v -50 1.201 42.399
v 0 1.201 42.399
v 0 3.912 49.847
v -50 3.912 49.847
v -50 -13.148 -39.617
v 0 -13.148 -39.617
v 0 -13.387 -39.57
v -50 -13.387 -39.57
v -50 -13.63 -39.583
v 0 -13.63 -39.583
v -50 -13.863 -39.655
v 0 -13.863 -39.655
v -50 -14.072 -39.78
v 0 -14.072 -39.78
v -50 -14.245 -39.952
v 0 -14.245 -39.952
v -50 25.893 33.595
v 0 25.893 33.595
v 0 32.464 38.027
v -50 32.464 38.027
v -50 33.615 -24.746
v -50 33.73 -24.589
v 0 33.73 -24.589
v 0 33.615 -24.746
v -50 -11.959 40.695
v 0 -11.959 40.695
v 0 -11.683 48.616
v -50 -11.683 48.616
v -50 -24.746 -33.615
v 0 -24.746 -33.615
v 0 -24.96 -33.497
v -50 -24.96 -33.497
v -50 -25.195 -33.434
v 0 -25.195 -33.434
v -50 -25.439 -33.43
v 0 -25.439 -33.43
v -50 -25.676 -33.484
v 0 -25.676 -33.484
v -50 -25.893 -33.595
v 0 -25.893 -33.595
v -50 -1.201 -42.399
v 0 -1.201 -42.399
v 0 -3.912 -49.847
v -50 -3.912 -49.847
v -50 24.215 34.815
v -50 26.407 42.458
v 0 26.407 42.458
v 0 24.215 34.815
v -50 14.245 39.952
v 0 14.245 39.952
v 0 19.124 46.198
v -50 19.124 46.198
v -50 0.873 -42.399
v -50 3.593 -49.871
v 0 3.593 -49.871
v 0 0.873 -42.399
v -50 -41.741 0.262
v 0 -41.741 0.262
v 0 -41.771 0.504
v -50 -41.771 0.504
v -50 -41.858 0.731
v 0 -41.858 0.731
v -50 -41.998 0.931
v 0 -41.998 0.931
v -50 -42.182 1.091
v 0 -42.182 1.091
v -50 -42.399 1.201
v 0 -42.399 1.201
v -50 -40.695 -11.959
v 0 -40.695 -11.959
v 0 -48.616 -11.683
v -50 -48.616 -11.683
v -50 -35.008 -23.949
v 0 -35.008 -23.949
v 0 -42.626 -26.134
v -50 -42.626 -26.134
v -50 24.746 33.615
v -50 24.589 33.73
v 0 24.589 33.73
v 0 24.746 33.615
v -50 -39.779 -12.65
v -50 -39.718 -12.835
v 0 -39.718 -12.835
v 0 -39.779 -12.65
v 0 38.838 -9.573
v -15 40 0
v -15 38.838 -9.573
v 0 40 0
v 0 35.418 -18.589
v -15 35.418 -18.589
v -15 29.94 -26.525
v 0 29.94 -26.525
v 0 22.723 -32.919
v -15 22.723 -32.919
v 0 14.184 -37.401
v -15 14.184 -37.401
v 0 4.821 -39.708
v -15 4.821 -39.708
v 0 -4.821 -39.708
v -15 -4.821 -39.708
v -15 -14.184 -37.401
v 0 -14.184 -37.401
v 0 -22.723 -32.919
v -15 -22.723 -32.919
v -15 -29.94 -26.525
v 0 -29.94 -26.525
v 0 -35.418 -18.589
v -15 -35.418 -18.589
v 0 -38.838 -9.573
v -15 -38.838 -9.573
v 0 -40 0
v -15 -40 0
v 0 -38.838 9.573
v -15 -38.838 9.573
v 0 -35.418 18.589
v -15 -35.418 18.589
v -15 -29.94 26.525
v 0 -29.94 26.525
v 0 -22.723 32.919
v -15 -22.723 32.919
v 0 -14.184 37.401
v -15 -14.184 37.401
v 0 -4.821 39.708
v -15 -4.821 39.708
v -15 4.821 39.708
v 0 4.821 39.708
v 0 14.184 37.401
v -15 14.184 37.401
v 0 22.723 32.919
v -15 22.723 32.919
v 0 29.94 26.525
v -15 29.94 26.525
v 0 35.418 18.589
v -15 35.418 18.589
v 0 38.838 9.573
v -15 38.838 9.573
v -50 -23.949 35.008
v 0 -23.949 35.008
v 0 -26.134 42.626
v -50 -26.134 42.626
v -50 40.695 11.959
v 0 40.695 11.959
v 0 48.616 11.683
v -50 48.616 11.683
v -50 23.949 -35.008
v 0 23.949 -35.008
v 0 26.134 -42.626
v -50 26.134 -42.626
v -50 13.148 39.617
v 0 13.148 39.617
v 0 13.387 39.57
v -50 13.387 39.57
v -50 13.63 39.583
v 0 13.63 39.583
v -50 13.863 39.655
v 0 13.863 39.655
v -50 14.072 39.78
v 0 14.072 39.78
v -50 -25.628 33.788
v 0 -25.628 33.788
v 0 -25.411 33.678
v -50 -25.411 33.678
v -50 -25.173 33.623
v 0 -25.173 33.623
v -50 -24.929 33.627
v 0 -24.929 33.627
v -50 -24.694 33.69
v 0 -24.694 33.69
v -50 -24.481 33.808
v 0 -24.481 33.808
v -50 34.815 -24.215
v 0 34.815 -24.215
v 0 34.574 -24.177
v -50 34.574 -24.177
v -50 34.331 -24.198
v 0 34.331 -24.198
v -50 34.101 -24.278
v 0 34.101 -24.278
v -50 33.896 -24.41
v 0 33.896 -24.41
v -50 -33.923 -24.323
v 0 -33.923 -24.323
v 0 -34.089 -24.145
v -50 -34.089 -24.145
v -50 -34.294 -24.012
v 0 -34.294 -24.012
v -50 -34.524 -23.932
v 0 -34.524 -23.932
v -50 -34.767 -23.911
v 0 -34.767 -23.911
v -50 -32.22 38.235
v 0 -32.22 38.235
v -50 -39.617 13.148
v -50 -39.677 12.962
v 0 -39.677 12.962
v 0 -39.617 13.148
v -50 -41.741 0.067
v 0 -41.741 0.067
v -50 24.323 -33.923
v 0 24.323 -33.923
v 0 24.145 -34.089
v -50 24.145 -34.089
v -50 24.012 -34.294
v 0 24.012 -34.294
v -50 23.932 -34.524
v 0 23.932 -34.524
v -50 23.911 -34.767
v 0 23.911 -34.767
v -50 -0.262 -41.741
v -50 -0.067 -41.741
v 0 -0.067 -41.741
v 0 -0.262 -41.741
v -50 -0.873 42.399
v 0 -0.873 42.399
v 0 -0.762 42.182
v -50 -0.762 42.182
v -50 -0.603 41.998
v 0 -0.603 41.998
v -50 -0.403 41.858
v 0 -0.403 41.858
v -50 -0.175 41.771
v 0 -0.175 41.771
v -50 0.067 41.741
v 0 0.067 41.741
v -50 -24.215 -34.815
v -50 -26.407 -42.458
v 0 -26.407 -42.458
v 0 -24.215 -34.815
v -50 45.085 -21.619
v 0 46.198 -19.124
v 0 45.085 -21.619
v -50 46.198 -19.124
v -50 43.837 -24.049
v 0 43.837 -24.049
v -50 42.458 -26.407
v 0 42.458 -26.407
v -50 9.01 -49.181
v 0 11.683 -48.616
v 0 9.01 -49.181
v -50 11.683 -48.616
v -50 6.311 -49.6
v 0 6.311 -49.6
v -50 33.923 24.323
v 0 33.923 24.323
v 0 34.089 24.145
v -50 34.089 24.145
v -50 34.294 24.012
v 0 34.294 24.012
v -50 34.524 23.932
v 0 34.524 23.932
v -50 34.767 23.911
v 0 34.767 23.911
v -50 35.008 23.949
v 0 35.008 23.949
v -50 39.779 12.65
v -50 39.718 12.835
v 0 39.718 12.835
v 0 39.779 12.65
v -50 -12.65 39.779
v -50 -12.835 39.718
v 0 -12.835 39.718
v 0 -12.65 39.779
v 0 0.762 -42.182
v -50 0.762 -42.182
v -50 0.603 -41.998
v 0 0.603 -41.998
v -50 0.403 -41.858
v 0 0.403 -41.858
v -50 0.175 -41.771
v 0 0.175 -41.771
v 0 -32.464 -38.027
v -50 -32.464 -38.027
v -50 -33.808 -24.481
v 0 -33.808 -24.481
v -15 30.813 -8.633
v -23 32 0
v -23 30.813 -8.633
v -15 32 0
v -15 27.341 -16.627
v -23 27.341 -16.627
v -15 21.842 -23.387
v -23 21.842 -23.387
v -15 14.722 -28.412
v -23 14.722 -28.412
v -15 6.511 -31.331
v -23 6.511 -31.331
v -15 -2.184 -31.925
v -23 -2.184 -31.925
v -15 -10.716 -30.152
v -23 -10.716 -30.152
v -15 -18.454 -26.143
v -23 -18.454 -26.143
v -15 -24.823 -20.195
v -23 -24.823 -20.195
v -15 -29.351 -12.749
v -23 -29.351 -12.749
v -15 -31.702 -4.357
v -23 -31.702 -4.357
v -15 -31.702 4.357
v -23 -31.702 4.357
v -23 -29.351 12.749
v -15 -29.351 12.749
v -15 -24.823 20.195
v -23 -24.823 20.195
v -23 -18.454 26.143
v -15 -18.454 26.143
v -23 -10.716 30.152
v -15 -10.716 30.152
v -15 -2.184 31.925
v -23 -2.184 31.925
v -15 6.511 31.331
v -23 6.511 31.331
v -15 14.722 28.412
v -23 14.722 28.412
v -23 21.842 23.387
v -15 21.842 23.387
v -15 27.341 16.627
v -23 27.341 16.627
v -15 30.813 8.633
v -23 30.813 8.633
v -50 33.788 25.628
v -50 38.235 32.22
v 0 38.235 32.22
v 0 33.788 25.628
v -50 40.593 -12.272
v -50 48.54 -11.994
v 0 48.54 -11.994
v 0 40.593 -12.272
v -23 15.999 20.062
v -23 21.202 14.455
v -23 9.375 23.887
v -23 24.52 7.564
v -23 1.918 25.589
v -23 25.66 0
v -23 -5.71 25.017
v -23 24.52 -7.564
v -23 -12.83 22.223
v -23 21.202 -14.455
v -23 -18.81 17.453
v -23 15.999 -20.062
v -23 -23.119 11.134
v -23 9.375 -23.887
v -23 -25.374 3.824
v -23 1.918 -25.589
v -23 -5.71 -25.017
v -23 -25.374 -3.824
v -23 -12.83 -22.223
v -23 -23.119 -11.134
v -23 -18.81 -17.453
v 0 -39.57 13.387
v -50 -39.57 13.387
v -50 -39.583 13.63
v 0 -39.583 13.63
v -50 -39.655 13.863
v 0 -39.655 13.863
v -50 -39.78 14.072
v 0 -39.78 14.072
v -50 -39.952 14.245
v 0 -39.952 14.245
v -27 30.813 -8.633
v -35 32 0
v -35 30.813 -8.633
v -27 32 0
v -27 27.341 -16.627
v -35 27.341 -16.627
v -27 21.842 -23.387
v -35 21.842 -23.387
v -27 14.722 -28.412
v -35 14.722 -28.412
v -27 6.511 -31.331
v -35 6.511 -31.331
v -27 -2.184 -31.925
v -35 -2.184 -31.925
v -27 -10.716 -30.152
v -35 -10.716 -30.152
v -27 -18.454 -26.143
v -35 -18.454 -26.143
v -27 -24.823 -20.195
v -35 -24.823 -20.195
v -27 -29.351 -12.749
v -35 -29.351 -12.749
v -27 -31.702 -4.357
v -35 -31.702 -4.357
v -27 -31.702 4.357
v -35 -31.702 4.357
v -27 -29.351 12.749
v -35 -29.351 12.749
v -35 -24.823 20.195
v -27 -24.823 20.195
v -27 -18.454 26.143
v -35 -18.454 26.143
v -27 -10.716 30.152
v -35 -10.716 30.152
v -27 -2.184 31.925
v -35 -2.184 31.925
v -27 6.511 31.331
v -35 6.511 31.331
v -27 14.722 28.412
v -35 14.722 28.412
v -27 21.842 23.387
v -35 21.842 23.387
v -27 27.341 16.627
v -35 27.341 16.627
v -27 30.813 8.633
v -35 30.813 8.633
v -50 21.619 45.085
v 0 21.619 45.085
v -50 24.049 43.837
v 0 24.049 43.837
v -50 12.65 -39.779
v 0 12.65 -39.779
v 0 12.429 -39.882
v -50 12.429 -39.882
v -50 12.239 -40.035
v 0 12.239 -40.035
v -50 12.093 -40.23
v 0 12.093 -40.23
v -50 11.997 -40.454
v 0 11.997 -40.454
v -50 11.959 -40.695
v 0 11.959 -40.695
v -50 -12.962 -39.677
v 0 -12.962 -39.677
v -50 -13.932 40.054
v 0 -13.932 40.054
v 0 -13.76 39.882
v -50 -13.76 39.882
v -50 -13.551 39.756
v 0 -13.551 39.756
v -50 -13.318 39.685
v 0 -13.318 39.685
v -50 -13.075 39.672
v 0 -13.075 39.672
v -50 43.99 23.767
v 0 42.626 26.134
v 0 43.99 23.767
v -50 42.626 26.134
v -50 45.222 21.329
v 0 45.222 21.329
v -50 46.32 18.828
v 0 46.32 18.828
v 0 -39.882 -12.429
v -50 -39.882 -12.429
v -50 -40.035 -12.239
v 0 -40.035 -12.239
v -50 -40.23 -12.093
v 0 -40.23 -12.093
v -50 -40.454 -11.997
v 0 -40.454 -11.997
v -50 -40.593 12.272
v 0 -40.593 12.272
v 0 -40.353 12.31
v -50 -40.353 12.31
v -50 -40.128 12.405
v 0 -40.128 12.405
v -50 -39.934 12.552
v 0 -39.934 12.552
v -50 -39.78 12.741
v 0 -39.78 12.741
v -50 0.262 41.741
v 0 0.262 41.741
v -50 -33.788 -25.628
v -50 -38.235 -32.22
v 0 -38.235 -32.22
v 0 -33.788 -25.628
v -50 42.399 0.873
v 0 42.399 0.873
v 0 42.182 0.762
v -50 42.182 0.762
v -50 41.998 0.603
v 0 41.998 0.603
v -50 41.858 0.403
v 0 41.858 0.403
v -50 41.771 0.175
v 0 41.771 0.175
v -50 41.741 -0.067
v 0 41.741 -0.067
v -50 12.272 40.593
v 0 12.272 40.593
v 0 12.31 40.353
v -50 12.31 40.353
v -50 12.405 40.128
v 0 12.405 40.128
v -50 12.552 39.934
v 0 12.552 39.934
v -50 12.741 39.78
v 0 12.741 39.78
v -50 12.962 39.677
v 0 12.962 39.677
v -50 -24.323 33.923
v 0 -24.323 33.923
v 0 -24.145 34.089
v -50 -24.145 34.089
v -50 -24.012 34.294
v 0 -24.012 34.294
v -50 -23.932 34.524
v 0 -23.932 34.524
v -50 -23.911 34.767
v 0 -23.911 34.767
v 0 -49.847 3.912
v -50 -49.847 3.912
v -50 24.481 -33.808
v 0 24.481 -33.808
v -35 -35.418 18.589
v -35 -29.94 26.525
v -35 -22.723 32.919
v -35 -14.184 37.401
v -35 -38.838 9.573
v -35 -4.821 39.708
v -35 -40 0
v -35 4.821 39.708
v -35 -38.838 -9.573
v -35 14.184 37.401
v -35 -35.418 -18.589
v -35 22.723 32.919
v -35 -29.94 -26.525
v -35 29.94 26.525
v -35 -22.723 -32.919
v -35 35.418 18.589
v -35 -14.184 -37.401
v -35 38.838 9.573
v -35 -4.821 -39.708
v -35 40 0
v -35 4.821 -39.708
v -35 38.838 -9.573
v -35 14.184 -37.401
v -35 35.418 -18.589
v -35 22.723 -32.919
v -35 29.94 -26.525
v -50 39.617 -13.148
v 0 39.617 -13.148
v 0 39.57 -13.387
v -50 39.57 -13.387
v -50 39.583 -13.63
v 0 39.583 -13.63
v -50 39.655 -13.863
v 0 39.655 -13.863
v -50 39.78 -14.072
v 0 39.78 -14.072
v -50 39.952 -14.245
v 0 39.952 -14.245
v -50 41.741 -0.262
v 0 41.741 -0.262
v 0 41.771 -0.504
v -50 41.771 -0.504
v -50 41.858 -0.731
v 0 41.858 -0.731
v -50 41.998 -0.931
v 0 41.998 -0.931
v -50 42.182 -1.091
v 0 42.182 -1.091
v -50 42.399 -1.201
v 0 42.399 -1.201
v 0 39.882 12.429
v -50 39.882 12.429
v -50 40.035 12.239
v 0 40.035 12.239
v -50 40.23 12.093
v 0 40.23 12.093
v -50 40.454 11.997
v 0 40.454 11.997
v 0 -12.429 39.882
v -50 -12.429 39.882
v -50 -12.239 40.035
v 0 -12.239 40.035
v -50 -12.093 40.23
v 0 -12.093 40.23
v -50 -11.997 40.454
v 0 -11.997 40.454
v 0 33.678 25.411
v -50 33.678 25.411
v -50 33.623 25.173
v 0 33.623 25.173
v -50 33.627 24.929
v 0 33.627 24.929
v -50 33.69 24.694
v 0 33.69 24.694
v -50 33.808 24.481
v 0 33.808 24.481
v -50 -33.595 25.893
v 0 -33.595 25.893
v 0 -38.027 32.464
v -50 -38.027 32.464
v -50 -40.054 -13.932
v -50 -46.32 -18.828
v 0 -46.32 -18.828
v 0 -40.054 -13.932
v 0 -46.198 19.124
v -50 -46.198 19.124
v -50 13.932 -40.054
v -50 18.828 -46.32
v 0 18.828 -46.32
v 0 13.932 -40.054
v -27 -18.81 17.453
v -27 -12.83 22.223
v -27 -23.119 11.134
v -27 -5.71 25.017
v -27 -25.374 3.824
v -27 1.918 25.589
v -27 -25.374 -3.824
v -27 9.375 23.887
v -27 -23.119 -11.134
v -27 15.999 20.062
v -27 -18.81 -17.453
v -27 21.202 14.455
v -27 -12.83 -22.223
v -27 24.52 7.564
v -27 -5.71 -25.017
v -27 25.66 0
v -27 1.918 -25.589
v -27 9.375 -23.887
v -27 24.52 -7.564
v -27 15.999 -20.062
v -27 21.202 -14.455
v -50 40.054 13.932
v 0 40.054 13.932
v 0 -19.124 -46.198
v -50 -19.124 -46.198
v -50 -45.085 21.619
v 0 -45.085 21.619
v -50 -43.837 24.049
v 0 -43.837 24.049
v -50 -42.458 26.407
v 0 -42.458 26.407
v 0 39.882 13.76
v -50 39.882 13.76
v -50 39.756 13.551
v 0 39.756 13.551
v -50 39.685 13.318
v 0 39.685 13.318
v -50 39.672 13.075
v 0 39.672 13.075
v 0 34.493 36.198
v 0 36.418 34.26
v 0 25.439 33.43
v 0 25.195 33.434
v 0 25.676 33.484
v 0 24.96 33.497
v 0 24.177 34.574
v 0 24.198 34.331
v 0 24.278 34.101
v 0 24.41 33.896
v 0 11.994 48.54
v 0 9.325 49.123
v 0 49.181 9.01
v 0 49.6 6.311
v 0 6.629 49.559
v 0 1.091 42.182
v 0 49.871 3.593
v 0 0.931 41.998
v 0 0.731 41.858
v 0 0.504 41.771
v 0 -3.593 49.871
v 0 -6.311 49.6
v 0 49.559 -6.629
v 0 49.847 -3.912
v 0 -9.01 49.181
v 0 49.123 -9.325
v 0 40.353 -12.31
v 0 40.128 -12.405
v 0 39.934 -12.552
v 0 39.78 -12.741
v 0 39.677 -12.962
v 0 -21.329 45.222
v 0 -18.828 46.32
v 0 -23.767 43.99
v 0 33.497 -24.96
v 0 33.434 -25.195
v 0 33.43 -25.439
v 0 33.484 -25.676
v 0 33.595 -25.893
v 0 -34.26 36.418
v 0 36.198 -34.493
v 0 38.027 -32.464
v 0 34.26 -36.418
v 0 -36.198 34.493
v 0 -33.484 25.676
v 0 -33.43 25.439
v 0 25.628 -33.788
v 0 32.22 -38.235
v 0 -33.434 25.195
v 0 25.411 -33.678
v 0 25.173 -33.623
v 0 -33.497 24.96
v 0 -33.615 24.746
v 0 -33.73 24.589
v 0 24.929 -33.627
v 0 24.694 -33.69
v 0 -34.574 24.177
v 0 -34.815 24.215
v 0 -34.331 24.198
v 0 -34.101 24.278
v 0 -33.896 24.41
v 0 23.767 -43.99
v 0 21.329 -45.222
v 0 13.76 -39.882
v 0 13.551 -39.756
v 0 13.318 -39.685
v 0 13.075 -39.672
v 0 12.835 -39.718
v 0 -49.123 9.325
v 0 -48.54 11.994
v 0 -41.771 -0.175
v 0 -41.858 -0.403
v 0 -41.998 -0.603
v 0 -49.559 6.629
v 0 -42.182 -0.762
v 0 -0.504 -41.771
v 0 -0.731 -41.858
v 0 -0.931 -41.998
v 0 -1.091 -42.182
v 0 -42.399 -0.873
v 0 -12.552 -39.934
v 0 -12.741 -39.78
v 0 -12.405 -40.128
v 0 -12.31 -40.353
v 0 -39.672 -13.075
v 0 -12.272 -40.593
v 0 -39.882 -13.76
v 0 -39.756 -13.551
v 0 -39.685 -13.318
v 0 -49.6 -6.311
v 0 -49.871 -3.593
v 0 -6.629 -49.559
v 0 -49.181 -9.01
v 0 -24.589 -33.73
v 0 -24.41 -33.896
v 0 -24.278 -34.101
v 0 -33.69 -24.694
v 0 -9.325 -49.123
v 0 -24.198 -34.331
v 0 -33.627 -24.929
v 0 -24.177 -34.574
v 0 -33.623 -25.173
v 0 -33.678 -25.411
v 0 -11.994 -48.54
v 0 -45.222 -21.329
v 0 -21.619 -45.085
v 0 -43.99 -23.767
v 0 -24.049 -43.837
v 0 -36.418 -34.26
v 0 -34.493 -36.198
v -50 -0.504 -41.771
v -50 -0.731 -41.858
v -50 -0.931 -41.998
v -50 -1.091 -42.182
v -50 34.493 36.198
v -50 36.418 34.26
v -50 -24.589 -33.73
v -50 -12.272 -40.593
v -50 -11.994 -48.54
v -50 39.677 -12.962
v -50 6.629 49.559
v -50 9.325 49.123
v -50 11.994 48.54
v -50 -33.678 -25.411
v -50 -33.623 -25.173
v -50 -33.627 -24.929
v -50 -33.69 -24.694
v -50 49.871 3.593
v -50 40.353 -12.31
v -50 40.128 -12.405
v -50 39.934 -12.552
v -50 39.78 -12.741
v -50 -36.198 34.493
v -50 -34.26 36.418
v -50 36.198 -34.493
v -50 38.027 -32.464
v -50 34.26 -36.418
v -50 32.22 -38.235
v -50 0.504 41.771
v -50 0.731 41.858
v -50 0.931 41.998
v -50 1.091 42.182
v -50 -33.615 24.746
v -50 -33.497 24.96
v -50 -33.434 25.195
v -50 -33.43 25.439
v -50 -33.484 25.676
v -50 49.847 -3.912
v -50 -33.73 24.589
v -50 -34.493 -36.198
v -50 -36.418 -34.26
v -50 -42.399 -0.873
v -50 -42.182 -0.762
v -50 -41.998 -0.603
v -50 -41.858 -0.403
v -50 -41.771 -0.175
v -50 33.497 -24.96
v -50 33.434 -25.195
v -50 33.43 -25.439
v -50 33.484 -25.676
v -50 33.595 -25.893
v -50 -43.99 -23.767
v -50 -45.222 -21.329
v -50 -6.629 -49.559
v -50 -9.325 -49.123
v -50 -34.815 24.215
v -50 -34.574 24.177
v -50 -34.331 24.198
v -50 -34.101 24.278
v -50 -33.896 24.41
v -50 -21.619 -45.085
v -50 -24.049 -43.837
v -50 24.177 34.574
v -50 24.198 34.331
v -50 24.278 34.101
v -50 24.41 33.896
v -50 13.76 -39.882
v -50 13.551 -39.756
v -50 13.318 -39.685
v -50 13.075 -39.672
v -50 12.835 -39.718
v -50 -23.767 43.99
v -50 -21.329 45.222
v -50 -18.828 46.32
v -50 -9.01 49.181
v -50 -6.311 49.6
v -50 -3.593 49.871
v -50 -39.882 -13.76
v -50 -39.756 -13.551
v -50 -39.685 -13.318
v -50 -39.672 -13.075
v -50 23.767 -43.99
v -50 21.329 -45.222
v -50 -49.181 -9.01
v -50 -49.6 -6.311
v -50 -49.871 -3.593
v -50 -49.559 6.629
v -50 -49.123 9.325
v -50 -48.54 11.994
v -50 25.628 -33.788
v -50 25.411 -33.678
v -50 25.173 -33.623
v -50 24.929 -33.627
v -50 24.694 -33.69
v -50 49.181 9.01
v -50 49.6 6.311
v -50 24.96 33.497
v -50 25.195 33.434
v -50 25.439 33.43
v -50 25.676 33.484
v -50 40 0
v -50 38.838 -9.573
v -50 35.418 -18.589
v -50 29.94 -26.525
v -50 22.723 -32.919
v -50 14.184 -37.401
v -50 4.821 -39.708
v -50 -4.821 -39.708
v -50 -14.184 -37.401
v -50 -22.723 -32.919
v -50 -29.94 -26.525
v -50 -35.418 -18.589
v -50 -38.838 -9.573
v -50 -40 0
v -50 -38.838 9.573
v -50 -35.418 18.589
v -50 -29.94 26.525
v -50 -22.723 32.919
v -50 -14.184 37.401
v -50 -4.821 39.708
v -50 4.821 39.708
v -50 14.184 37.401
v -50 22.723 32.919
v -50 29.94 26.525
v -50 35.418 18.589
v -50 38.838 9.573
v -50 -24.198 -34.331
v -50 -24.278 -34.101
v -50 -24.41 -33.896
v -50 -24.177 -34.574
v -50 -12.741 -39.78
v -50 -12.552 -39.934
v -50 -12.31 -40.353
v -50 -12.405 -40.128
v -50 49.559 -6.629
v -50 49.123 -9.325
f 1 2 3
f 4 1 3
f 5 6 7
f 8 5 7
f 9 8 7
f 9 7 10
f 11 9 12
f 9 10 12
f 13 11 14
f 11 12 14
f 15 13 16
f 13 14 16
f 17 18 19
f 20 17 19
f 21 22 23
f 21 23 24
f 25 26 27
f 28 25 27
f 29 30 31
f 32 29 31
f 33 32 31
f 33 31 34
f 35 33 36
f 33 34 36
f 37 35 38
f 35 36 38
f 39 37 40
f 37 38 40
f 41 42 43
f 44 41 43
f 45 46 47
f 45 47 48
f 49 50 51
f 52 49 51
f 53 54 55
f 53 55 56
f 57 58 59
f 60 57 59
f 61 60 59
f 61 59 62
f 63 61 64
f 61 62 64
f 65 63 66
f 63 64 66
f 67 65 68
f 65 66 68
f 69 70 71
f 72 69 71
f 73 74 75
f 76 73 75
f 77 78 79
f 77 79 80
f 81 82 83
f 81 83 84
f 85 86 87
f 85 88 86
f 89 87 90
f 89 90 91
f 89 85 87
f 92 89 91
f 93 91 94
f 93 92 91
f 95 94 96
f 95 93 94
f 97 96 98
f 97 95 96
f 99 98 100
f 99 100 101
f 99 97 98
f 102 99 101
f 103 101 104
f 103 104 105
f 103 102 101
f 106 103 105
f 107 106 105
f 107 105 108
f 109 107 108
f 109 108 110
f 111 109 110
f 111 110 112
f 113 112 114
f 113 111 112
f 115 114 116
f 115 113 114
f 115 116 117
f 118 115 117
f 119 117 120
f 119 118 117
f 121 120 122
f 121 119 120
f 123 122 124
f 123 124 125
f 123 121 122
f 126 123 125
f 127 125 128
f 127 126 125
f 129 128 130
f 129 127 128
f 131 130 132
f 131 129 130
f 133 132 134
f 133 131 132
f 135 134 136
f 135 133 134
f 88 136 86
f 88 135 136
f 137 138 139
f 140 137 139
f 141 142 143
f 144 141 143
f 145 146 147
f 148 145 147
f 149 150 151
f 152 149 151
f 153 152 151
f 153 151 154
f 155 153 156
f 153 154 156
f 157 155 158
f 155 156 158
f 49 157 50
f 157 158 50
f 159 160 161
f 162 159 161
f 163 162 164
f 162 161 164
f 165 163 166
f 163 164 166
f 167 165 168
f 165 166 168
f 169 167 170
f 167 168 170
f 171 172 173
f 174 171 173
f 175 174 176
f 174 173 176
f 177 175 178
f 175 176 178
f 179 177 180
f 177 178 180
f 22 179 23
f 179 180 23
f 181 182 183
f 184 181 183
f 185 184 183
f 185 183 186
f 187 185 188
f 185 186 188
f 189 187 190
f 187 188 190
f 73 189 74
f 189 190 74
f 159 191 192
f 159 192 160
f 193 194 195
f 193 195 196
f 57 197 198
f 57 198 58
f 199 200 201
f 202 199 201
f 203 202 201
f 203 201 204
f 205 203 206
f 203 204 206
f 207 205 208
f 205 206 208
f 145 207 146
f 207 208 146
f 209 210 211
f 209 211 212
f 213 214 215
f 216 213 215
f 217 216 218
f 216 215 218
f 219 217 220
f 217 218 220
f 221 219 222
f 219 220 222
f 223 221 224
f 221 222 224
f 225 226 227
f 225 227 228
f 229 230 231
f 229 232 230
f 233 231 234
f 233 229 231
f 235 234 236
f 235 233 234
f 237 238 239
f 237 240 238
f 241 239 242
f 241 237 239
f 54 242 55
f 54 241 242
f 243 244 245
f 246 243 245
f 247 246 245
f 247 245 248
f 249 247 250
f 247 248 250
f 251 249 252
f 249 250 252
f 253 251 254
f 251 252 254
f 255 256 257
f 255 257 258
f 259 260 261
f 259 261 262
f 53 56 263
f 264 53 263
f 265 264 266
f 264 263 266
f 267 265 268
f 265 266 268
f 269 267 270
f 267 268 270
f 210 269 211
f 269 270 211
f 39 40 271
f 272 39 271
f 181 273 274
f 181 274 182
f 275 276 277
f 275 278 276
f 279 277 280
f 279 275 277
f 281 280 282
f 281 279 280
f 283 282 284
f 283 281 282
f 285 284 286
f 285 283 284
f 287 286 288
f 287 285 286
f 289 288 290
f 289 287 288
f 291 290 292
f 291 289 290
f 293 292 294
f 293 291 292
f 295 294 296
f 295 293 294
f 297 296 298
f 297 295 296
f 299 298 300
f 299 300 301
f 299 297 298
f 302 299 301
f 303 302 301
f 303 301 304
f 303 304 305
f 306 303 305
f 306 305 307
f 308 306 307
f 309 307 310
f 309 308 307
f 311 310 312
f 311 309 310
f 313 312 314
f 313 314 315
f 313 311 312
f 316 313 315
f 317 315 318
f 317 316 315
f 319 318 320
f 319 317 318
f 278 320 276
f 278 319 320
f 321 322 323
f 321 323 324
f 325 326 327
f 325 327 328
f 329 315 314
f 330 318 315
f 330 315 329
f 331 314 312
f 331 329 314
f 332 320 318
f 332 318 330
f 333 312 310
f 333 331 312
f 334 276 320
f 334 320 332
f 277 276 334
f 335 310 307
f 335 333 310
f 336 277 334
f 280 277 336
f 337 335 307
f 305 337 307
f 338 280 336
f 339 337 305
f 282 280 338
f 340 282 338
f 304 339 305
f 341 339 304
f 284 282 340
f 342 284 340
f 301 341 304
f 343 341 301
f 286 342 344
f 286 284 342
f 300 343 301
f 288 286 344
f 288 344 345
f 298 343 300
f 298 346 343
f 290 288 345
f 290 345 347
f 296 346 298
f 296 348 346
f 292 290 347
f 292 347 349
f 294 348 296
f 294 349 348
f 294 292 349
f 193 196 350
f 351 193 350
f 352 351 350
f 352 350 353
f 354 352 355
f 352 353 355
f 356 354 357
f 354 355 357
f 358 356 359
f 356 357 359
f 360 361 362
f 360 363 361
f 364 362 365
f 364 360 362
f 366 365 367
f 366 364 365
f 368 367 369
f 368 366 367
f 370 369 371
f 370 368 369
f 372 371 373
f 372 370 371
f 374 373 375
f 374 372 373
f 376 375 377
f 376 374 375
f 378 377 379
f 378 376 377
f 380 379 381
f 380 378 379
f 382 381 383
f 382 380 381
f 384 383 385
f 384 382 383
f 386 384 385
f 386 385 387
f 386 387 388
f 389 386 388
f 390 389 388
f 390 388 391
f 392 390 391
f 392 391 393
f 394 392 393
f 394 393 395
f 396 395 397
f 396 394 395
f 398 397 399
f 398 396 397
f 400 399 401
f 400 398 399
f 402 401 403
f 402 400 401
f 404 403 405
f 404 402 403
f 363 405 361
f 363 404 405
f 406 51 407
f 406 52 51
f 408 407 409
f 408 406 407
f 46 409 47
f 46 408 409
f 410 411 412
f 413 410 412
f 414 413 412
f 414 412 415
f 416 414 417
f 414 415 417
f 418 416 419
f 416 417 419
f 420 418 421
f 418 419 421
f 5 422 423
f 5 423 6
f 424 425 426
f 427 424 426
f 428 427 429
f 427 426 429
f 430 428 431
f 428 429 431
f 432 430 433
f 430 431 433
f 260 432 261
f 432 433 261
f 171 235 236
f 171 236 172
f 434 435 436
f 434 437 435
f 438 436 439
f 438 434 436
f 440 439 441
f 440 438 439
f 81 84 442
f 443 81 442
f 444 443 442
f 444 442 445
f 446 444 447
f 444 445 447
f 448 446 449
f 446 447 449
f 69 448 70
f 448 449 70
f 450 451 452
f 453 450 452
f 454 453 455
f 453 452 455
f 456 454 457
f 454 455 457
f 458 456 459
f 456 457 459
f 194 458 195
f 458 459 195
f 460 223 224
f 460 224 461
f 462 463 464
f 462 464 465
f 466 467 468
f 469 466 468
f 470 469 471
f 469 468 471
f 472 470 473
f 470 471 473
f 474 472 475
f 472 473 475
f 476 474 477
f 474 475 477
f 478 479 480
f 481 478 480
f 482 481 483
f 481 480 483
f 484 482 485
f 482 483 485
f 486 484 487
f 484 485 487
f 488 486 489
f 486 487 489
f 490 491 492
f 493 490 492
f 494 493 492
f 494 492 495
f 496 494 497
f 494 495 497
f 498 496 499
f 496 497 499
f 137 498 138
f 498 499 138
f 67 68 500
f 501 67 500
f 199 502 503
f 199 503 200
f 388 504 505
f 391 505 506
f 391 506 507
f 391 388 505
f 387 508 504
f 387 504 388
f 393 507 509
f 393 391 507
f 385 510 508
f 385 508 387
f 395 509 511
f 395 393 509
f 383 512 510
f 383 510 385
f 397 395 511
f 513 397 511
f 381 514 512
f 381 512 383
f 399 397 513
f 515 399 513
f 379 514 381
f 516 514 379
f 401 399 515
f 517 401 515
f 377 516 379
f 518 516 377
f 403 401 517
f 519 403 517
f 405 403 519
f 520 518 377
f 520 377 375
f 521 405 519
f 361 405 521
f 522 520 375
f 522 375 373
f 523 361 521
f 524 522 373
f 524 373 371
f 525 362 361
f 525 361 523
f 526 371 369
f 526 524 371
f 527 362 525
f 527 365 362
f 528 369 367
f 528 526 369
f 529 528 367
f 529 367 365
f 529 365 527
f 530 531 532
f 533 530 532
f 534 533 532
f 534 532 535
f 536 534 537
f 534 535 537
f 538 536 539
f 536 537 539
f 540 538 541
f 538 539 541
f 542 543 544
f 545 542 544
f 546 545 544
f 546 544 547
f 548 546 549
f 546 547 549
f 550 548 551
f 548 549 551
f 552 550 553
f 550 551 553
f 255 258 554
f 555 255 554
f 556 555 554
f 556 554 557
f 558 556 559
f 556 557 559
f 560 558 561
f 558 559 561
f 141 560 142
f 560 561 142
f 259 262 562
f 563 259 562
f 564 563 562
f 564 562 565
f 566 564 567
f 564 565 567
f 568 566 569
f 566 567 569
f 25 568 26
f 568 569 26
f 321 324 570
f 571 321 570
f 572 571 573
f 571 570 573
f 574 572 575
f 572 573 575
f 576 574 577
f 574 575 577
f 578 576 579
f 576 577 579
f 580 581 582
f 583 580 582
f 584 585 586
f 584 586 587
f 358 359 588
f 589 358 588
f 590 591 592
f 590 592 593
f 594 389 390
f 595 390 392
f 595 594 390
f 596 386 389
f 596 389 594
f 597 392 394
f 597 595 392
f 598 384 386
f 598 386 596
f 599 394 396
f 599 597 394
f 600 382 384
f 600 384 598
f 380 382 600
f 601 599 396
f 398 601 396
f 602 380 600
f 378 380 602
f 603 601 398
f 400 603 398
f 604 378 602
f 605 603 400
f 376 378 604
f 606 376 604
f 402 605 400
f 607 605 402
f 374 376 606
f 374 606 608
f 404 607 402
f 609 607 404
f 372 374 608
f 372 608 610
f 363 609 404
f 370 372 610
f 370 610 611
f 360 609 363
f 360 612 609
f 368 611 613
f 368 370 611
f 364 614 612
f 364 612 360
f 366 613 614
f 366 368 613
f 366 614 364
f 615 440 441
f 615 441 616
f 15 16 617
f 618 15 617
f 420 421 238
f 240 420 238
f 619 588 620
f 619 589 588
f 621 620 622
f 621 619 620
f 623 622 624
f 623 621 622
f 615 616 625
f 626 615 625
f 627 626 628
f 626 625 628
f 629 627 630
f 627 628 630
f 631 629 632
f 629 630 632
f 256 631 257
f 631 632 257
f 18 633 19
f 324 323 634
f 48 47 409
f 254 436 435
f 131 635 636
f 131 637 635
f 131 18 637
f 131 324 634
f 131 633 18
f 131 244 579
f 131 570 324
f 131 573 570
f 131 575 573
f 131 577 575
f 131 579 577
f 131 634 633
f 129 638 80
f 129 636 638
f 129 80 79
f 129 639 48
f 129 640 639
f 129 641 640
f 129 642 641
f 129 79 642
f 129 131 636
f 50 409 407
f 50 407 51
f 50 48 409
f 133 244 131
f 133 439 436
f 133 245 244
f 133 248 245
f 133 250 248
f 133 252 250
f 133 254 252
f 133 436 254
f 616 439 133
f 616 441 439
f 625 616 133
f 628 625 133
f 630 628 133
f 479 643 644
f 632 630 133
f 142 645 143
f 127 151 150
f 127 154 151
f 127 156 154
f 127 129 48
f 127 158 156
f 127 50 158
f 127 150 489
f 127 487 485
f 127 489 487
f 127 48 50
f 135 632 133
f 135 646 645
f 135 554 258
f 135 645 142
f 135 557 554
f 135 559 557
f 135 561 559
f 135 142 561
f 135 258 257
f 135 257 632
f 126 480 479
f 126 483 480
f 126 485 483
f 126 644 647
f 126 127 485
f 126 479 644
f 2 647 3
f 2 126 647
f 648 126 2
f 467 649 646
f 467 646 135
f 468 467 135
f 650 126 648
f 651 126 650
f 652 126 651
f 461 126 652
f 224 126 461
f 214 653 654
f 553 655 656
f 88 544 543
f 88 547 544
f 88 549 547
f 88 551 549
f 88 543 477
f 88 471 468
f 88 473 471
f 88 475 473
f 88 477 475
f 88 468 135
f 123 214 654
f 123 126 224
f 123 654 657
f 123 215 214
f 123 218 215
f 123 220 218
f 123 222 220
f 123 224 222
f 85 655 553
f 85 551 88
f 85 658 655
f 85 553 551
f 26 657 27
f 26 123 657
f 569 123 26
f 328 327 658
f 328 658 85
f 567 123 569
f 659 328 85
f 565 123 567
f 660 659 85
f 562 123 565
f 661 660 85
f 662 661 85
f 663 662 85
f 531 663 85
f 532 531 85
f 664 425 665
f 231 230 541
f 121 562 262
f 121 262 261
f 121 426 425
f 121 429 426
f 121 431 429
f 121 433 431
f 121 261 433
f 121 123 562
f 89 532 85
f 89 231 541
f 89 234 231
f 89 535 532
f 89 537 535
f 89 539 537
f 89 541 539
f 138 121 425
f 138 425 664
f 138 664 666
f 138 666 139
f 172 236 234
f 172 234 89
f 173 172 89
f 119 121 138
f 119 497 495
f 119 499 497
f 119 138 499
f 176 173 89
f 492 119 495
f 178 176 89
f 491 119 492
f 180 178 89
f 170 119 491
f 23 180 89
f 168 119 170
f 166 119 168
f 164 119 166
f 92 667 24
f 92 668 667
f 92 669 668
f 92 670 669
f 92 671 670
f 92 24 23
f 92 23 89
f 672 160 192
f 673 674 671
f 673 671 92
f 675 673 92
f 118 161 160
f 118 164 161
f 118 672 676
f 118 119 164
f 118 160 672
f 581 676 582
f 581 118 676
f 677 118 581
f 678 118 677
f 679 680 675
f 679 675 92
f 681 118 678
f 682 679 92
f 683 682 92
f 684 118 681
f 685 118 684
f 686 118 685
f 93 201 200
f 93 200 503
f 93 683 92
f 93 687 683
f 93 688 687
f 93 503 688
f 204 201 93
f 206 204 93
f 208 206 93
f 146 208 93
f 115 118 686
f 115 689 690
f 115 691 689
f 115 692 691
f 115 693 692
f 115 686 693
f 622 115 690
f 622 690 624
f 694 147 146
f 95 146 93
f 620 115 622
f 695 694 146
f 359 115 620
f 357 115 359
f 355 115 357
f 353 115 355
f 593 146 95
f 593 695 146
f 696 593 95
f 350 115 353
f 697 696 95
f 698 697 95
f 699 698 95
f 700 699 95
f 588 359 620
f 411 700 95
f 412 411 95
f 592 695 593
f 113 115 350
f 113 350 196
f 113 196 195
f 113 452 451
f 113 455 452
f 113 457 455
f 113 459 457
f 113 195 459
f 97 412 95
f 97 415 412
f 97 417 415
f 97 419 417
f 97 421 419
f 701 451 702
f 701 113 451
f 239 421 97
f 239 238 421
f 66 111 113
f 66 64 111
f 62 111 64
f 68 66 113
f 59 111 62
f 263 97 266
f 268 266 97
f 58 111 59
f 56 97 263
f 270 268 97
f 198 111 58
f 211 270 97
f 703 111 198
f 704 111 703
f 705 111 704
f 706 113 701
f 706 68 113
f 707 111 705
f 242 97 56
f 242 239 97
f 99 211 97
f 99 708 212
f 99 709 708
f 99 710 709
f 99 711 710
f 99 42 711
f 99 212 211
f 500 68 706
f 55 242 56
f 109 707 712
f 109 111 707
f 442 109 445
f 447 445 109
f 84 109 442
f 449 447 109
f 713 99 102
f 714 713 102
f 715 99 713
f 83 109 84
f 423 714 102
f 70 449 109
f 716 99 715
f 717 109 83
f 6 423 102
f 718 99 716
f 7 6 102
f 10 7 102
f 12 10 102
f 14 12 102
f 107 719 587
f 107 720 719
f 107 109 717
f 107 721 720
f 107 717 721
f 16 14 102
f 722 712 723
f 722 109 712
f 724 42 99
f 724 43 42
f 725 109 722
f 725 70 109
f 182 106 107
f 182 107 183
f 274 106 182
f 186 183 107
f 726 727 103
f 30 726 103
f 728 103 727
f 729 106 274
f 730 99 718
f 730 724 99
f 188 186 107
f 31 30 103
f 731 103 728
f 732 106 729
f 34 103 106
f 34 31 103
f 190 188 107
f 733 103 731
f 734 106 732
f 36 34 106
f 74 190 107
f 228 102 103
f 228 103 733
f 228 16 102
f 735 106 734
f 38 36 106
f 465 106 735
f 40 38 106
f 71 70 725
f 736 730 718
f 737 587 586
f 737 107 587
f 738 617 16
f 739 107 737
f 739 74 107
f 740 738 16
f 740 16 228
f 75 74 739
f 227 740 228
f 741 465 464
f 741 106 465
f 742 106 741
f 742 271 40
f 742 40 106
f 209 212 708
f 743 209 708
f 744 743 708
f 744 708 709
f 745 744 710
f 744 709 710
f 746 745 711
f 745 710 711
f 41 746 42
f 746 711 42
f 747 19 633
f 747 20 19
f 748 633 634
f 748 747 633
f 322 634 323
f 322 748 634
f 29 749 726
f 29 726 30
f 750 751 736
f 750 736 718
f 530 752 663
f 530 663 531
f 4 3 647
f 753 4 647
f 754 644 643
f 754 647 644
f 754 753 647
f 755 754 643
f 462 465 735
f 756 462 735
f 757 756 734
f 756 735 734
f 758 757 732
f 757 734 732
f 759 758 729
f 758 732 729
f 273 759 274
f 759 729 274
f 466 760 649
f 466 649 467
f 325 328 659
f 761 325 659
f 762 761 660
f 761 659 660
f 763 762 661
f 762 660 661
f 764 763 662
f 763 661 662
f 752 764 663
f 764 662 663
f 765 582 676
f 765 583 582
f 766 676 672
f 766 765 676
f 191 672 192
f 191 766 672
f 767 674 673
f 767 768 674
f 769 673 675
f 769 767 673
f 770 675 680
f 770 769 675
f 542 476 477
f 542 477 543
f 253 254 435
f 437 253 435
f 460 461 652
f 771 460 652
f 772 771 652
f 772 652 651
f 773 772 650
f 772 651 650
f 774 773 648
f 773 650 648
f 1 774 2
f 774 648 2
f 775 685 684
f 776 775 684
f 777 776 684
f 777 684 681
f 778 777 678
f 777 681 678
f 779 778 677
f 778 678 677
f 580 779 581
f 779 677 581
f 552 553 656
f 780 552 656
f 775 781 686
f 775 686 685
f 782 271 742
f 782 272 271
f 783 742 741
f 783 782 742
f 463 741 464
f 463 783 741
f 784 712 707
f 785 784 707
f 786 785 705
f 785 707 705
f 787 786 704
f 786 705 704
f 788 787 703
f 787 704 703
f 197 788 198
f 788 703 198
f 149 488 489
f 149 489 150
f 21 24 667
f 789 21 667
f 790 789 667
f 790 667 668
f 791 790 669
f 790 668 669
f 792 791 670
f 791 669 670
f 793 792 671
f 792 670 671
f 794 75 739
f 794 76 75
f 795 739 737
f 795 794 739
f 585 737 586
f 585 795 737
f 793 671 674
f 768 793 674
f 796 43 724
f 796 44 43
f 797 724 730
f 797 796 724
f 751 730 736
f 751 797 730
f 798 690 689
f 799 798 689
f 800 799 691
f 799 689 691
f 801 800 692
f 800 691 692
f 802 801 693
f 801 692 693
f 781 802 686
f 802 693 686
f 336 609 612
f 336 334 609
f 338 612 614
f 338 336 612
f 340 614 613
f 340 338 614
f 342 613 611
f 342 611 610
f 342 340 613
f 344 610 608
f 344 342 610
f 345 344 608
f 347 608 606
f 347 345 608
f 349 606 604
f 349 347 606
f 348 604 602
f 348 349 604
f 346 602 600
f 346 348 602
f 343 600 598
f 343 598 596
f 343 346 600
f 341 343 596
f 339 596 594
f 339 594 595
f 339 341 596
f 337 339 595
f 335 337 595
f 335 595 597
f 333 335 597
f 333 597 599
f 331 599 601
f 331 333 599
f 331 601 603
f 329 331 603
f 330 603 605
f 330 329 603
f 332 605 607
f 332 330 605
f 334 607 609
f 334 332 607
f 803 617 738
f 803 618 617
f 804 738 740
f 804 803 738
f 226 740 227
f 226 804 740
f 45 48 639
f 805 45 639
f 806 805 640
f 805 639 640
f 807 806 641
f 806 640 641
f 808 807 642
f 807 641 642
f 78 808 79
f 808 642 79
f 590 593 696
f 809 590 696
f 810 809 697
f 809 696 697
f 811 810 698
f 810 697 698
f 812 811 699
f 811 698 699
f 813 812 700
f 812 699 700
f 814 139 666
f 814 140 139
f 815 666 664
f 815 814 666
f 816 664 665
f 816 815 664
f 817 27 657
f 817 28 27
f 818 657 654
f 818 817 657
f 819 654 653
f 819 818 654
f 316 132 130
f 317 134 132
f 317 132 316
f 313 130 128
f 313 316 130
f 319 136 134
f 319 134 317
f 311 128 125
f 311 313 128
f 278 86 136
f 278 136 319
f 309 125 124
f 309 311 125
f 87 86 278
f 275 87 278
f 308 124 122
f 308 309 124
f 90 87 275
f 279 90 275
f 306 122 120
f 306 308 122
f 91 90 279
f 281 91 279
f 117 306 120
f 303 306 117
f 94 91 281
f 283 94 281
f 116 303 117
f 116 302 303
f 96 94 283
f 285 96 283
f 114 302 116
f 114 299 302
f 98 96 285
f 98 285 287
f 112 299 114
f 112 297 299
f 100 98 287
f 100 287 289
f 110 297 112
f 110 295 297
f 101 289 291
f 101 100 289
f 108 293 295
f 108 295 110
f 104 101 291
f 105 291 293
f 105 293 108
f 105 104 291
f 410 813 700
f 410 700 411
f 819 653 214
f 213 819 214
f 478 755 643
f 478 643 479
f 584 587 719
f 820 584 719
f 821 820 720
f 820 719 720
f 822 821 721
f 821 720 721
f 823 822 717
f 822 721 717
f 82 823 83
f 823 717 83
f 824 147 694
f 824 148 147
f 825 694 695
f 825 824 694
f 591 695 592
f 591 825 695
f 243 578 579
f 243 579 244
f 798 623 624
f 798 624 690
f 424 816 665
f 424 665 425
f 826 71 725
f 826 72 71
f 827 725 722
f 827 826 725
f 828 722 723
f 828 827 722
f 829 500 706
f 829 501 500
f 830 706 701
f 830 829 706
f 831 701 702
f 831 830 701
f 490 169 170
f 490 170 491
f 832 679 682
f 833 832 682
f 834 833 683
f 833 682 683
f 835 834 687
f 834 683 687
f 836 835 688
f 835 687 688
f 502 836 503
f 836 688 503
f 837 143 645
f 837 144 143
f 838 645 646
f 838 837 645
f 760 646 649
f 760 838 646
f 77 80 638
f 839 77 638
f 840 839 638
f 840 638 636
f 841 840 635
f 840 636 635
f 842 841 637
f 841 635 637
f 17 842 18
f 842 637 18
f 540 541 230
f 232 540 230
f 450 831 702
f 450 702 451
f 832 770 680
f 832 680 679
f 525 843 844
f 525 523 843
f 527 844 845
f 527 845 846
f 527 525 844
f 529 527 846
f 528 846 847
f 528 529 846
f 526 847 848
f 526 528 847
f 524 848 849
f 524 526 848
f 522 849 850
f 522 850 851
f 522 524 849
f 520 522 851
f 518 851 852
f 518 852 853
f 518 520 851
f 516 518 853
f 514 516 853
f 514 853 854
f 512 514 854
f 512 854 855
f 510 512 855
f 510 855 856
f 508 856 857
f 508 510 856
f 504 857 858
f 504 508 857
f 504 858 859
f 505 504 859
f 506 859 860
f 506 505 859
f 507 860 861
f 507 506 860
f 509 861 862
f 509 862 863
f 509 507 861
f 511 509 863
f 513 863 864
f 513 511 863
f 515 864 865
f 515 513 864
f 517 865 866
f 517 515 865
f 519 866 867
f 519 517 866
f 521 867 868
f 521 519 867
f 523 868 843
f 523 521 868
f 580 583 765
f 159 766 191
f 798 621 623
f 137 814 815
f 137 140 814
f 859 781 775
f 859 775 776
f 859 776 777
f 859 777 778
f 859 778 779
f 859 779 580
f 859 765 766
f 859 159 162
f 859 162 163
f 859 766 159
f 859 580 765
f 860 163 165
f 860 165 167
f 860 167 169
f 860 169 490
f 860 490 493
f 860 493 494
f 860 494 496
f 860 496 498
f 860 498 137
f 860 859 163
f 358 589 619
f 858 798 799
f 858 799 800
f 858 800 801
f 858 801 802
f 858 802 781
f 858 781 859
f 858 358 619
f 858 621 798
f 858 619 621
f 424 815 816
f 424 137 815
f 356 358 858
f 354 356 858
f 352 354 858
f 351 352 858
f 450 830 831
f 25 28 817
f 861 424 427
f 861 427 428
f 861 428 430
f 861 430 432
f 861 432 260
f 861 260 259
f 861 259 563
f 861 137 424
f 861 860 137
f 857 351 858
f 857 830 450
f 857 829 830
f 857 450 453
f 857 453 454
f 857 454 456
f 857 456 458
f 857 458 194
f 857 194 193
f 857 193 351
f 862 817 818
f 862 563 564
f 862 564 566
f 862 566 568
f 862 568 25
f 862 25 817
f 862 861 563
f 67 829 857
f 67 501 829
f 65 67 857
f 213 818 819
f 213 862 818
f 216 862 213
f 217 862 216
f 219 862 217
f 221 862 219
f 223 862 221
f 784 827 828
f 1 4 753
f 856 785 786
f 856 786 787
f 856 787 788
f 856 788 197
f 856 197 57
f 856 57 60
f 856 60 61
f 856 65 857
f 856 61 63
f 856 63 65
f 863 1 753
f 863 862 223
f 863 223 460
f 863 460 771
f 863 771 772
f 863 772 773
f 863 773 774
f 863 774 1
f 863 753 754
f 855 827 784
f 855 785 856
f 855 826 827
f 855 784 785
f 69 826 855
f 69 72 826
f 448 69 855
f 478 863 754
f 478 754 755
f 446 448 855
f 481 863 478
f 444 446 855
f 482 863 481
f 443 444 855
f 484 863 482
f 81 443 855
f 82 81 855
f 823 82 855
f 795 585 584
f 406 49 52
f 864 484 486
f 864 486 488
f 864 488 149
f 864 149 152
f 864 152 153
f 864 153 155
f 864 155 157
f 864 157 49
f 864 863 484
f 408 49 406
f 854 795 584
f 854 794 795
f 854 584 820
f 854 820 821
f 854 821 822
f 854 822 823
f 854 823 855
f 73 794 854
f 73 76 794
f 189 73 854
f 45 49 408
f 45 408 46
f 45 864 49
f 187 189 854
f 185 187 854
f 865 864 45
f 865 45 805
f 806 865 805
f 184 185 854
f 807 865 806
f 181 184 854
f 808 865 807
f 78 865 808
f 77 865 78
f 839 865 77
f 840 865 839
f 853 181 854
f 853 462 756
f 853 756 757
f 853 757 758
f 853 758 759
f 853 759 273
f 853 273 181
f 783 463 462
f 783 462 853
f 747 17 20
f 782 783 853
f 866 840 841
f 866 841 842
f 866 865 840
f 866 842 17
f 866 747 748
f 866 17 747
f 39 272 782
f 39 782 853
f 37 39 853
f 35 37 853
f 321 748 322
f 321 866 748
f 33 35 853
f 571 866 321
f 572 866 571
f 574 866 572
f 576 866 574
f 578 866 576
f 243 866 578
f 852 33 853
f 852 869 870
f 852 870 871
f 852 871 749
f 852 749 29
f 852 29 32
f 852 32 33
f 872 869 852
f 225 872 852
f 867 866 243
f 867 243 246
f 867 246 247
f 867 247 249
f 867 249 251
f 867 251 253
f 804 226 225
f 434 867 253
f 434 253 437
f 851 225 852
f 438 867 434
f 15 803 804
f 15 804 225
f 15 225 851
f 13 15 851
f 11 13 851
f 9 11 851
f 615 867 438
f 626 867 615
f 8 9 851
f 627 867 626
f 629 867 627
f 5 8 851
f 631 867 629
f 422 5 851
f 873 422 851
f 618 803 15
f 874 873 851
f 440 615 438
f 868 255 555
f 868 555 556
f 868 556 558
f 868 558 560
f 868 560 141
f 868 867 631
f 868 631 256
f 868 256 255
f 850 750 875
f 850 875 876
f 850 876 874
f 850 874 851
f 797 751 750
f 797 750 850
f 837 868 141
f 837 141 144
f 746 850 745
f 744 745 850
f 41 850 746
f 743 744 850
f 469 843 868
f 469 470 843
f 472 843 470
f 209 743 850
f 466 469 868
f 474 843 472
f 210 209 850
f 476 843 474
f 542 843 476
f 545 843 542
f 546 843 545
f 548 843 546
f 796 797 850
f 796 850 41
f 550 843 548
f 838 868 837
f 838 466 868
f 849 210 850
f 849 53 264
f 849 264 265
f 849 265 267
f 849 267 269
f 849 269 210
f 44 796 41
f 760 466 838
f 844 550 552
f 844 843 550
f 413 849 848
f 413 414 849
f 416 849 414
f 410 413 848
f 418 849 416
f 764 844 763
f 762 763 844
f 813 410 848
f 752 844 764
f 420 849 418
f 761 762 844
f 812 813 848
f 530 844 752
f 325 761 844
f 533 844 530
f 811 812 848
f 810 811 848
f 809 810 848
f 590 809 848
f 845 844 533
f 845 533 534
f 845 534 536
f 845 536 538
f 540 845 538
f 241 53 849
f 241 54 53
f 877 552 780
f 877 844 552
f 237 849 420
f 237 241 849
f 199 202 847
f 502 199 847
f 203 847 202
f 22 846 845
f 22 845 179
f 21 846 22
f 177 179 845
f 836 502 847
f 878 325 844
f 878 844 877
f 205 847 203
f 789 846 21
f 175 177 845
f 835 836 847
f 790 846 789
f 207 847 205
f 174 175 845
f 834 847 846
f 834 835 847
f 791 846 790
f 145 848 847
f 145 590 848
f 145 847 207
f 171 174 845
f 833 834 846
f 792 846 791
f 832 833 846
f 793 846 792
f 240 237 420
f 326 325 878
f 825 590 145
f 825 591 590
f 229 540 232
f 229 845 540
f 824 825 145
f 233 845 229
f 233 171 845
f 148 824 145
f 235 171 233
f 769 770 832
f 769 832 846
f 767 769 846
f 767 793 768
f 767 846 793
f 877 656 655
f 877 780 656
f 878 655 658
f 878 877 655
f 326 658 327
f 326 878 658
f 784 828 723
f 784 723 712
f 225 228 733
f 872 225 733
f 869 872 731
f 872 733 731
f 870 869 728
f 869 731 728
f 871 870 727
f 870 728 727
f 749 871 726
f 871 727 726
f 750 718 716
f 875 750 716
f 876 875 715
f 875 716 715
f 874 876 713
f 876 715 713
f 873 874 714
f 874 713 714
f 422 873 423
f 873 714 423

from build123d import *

# Parameters (mm, degrees)
F3_DEPTH = 50
F4_COUNT = 20


with BuildPart() as f1:
    # F0 (on Top) → F1 (revolve)
    with BuildSketch(Plane.XY):
        Polygon((0, 40), (0, 50), (-50, 50), (-50, 40), (-35, 40), (-35, 32), (-27, 32), (-27, 25.6603773385), (-23, 25.6603773385), (-23, 32), (-15, 32), (-15, 40), align=None)
    revolve(axis=Axis((-25, 0, 0), (-1, 0, 0)))

    # F2 (on face) → F3 (cut)
    with BuildSketch(Plane.YZ):
        with BuildLine():
            Line((1.2014859403, 42.3988246892), (3.9122925633, 49.8467046744))
            ThreePointArc((3.9122925633, 49.8467046744), (0.160266729, 49.9997431451), (-3.5926630814, 49.8707606918))
            Line((-3.5926630814, 49.8707606918), (-0.8731007841, 42.3988246892))
            ThreePointArc((-0.8731007841, 42.3988246892), (-0.5069845997, 41.9216927883), (0.0665918367, 41.7408448326))
            Line((0.0665918367, 41.7408448326), (0.2617933195, 41.7408448326))
            ThreePointArc((0.2617933195, 41.7408448326), (0.8353697558, 41.9216927883), (1.2014859403, 42.3988246892))
        make_face()
    f3 = extrude(amount=-F3_DEPTH, mode=Mode.SUBTRACT)

    # F4: F3 ×20 about axis
    f4_axis = Axis((0, 0, 0), (-1, 0, 0))
    for i in range(1, F4_COUNT):
        add(f3.rotate(f4_axis, i * 360 / F4_COUNT), mode=Mode.SUBTRACT)


solid = f1.part
